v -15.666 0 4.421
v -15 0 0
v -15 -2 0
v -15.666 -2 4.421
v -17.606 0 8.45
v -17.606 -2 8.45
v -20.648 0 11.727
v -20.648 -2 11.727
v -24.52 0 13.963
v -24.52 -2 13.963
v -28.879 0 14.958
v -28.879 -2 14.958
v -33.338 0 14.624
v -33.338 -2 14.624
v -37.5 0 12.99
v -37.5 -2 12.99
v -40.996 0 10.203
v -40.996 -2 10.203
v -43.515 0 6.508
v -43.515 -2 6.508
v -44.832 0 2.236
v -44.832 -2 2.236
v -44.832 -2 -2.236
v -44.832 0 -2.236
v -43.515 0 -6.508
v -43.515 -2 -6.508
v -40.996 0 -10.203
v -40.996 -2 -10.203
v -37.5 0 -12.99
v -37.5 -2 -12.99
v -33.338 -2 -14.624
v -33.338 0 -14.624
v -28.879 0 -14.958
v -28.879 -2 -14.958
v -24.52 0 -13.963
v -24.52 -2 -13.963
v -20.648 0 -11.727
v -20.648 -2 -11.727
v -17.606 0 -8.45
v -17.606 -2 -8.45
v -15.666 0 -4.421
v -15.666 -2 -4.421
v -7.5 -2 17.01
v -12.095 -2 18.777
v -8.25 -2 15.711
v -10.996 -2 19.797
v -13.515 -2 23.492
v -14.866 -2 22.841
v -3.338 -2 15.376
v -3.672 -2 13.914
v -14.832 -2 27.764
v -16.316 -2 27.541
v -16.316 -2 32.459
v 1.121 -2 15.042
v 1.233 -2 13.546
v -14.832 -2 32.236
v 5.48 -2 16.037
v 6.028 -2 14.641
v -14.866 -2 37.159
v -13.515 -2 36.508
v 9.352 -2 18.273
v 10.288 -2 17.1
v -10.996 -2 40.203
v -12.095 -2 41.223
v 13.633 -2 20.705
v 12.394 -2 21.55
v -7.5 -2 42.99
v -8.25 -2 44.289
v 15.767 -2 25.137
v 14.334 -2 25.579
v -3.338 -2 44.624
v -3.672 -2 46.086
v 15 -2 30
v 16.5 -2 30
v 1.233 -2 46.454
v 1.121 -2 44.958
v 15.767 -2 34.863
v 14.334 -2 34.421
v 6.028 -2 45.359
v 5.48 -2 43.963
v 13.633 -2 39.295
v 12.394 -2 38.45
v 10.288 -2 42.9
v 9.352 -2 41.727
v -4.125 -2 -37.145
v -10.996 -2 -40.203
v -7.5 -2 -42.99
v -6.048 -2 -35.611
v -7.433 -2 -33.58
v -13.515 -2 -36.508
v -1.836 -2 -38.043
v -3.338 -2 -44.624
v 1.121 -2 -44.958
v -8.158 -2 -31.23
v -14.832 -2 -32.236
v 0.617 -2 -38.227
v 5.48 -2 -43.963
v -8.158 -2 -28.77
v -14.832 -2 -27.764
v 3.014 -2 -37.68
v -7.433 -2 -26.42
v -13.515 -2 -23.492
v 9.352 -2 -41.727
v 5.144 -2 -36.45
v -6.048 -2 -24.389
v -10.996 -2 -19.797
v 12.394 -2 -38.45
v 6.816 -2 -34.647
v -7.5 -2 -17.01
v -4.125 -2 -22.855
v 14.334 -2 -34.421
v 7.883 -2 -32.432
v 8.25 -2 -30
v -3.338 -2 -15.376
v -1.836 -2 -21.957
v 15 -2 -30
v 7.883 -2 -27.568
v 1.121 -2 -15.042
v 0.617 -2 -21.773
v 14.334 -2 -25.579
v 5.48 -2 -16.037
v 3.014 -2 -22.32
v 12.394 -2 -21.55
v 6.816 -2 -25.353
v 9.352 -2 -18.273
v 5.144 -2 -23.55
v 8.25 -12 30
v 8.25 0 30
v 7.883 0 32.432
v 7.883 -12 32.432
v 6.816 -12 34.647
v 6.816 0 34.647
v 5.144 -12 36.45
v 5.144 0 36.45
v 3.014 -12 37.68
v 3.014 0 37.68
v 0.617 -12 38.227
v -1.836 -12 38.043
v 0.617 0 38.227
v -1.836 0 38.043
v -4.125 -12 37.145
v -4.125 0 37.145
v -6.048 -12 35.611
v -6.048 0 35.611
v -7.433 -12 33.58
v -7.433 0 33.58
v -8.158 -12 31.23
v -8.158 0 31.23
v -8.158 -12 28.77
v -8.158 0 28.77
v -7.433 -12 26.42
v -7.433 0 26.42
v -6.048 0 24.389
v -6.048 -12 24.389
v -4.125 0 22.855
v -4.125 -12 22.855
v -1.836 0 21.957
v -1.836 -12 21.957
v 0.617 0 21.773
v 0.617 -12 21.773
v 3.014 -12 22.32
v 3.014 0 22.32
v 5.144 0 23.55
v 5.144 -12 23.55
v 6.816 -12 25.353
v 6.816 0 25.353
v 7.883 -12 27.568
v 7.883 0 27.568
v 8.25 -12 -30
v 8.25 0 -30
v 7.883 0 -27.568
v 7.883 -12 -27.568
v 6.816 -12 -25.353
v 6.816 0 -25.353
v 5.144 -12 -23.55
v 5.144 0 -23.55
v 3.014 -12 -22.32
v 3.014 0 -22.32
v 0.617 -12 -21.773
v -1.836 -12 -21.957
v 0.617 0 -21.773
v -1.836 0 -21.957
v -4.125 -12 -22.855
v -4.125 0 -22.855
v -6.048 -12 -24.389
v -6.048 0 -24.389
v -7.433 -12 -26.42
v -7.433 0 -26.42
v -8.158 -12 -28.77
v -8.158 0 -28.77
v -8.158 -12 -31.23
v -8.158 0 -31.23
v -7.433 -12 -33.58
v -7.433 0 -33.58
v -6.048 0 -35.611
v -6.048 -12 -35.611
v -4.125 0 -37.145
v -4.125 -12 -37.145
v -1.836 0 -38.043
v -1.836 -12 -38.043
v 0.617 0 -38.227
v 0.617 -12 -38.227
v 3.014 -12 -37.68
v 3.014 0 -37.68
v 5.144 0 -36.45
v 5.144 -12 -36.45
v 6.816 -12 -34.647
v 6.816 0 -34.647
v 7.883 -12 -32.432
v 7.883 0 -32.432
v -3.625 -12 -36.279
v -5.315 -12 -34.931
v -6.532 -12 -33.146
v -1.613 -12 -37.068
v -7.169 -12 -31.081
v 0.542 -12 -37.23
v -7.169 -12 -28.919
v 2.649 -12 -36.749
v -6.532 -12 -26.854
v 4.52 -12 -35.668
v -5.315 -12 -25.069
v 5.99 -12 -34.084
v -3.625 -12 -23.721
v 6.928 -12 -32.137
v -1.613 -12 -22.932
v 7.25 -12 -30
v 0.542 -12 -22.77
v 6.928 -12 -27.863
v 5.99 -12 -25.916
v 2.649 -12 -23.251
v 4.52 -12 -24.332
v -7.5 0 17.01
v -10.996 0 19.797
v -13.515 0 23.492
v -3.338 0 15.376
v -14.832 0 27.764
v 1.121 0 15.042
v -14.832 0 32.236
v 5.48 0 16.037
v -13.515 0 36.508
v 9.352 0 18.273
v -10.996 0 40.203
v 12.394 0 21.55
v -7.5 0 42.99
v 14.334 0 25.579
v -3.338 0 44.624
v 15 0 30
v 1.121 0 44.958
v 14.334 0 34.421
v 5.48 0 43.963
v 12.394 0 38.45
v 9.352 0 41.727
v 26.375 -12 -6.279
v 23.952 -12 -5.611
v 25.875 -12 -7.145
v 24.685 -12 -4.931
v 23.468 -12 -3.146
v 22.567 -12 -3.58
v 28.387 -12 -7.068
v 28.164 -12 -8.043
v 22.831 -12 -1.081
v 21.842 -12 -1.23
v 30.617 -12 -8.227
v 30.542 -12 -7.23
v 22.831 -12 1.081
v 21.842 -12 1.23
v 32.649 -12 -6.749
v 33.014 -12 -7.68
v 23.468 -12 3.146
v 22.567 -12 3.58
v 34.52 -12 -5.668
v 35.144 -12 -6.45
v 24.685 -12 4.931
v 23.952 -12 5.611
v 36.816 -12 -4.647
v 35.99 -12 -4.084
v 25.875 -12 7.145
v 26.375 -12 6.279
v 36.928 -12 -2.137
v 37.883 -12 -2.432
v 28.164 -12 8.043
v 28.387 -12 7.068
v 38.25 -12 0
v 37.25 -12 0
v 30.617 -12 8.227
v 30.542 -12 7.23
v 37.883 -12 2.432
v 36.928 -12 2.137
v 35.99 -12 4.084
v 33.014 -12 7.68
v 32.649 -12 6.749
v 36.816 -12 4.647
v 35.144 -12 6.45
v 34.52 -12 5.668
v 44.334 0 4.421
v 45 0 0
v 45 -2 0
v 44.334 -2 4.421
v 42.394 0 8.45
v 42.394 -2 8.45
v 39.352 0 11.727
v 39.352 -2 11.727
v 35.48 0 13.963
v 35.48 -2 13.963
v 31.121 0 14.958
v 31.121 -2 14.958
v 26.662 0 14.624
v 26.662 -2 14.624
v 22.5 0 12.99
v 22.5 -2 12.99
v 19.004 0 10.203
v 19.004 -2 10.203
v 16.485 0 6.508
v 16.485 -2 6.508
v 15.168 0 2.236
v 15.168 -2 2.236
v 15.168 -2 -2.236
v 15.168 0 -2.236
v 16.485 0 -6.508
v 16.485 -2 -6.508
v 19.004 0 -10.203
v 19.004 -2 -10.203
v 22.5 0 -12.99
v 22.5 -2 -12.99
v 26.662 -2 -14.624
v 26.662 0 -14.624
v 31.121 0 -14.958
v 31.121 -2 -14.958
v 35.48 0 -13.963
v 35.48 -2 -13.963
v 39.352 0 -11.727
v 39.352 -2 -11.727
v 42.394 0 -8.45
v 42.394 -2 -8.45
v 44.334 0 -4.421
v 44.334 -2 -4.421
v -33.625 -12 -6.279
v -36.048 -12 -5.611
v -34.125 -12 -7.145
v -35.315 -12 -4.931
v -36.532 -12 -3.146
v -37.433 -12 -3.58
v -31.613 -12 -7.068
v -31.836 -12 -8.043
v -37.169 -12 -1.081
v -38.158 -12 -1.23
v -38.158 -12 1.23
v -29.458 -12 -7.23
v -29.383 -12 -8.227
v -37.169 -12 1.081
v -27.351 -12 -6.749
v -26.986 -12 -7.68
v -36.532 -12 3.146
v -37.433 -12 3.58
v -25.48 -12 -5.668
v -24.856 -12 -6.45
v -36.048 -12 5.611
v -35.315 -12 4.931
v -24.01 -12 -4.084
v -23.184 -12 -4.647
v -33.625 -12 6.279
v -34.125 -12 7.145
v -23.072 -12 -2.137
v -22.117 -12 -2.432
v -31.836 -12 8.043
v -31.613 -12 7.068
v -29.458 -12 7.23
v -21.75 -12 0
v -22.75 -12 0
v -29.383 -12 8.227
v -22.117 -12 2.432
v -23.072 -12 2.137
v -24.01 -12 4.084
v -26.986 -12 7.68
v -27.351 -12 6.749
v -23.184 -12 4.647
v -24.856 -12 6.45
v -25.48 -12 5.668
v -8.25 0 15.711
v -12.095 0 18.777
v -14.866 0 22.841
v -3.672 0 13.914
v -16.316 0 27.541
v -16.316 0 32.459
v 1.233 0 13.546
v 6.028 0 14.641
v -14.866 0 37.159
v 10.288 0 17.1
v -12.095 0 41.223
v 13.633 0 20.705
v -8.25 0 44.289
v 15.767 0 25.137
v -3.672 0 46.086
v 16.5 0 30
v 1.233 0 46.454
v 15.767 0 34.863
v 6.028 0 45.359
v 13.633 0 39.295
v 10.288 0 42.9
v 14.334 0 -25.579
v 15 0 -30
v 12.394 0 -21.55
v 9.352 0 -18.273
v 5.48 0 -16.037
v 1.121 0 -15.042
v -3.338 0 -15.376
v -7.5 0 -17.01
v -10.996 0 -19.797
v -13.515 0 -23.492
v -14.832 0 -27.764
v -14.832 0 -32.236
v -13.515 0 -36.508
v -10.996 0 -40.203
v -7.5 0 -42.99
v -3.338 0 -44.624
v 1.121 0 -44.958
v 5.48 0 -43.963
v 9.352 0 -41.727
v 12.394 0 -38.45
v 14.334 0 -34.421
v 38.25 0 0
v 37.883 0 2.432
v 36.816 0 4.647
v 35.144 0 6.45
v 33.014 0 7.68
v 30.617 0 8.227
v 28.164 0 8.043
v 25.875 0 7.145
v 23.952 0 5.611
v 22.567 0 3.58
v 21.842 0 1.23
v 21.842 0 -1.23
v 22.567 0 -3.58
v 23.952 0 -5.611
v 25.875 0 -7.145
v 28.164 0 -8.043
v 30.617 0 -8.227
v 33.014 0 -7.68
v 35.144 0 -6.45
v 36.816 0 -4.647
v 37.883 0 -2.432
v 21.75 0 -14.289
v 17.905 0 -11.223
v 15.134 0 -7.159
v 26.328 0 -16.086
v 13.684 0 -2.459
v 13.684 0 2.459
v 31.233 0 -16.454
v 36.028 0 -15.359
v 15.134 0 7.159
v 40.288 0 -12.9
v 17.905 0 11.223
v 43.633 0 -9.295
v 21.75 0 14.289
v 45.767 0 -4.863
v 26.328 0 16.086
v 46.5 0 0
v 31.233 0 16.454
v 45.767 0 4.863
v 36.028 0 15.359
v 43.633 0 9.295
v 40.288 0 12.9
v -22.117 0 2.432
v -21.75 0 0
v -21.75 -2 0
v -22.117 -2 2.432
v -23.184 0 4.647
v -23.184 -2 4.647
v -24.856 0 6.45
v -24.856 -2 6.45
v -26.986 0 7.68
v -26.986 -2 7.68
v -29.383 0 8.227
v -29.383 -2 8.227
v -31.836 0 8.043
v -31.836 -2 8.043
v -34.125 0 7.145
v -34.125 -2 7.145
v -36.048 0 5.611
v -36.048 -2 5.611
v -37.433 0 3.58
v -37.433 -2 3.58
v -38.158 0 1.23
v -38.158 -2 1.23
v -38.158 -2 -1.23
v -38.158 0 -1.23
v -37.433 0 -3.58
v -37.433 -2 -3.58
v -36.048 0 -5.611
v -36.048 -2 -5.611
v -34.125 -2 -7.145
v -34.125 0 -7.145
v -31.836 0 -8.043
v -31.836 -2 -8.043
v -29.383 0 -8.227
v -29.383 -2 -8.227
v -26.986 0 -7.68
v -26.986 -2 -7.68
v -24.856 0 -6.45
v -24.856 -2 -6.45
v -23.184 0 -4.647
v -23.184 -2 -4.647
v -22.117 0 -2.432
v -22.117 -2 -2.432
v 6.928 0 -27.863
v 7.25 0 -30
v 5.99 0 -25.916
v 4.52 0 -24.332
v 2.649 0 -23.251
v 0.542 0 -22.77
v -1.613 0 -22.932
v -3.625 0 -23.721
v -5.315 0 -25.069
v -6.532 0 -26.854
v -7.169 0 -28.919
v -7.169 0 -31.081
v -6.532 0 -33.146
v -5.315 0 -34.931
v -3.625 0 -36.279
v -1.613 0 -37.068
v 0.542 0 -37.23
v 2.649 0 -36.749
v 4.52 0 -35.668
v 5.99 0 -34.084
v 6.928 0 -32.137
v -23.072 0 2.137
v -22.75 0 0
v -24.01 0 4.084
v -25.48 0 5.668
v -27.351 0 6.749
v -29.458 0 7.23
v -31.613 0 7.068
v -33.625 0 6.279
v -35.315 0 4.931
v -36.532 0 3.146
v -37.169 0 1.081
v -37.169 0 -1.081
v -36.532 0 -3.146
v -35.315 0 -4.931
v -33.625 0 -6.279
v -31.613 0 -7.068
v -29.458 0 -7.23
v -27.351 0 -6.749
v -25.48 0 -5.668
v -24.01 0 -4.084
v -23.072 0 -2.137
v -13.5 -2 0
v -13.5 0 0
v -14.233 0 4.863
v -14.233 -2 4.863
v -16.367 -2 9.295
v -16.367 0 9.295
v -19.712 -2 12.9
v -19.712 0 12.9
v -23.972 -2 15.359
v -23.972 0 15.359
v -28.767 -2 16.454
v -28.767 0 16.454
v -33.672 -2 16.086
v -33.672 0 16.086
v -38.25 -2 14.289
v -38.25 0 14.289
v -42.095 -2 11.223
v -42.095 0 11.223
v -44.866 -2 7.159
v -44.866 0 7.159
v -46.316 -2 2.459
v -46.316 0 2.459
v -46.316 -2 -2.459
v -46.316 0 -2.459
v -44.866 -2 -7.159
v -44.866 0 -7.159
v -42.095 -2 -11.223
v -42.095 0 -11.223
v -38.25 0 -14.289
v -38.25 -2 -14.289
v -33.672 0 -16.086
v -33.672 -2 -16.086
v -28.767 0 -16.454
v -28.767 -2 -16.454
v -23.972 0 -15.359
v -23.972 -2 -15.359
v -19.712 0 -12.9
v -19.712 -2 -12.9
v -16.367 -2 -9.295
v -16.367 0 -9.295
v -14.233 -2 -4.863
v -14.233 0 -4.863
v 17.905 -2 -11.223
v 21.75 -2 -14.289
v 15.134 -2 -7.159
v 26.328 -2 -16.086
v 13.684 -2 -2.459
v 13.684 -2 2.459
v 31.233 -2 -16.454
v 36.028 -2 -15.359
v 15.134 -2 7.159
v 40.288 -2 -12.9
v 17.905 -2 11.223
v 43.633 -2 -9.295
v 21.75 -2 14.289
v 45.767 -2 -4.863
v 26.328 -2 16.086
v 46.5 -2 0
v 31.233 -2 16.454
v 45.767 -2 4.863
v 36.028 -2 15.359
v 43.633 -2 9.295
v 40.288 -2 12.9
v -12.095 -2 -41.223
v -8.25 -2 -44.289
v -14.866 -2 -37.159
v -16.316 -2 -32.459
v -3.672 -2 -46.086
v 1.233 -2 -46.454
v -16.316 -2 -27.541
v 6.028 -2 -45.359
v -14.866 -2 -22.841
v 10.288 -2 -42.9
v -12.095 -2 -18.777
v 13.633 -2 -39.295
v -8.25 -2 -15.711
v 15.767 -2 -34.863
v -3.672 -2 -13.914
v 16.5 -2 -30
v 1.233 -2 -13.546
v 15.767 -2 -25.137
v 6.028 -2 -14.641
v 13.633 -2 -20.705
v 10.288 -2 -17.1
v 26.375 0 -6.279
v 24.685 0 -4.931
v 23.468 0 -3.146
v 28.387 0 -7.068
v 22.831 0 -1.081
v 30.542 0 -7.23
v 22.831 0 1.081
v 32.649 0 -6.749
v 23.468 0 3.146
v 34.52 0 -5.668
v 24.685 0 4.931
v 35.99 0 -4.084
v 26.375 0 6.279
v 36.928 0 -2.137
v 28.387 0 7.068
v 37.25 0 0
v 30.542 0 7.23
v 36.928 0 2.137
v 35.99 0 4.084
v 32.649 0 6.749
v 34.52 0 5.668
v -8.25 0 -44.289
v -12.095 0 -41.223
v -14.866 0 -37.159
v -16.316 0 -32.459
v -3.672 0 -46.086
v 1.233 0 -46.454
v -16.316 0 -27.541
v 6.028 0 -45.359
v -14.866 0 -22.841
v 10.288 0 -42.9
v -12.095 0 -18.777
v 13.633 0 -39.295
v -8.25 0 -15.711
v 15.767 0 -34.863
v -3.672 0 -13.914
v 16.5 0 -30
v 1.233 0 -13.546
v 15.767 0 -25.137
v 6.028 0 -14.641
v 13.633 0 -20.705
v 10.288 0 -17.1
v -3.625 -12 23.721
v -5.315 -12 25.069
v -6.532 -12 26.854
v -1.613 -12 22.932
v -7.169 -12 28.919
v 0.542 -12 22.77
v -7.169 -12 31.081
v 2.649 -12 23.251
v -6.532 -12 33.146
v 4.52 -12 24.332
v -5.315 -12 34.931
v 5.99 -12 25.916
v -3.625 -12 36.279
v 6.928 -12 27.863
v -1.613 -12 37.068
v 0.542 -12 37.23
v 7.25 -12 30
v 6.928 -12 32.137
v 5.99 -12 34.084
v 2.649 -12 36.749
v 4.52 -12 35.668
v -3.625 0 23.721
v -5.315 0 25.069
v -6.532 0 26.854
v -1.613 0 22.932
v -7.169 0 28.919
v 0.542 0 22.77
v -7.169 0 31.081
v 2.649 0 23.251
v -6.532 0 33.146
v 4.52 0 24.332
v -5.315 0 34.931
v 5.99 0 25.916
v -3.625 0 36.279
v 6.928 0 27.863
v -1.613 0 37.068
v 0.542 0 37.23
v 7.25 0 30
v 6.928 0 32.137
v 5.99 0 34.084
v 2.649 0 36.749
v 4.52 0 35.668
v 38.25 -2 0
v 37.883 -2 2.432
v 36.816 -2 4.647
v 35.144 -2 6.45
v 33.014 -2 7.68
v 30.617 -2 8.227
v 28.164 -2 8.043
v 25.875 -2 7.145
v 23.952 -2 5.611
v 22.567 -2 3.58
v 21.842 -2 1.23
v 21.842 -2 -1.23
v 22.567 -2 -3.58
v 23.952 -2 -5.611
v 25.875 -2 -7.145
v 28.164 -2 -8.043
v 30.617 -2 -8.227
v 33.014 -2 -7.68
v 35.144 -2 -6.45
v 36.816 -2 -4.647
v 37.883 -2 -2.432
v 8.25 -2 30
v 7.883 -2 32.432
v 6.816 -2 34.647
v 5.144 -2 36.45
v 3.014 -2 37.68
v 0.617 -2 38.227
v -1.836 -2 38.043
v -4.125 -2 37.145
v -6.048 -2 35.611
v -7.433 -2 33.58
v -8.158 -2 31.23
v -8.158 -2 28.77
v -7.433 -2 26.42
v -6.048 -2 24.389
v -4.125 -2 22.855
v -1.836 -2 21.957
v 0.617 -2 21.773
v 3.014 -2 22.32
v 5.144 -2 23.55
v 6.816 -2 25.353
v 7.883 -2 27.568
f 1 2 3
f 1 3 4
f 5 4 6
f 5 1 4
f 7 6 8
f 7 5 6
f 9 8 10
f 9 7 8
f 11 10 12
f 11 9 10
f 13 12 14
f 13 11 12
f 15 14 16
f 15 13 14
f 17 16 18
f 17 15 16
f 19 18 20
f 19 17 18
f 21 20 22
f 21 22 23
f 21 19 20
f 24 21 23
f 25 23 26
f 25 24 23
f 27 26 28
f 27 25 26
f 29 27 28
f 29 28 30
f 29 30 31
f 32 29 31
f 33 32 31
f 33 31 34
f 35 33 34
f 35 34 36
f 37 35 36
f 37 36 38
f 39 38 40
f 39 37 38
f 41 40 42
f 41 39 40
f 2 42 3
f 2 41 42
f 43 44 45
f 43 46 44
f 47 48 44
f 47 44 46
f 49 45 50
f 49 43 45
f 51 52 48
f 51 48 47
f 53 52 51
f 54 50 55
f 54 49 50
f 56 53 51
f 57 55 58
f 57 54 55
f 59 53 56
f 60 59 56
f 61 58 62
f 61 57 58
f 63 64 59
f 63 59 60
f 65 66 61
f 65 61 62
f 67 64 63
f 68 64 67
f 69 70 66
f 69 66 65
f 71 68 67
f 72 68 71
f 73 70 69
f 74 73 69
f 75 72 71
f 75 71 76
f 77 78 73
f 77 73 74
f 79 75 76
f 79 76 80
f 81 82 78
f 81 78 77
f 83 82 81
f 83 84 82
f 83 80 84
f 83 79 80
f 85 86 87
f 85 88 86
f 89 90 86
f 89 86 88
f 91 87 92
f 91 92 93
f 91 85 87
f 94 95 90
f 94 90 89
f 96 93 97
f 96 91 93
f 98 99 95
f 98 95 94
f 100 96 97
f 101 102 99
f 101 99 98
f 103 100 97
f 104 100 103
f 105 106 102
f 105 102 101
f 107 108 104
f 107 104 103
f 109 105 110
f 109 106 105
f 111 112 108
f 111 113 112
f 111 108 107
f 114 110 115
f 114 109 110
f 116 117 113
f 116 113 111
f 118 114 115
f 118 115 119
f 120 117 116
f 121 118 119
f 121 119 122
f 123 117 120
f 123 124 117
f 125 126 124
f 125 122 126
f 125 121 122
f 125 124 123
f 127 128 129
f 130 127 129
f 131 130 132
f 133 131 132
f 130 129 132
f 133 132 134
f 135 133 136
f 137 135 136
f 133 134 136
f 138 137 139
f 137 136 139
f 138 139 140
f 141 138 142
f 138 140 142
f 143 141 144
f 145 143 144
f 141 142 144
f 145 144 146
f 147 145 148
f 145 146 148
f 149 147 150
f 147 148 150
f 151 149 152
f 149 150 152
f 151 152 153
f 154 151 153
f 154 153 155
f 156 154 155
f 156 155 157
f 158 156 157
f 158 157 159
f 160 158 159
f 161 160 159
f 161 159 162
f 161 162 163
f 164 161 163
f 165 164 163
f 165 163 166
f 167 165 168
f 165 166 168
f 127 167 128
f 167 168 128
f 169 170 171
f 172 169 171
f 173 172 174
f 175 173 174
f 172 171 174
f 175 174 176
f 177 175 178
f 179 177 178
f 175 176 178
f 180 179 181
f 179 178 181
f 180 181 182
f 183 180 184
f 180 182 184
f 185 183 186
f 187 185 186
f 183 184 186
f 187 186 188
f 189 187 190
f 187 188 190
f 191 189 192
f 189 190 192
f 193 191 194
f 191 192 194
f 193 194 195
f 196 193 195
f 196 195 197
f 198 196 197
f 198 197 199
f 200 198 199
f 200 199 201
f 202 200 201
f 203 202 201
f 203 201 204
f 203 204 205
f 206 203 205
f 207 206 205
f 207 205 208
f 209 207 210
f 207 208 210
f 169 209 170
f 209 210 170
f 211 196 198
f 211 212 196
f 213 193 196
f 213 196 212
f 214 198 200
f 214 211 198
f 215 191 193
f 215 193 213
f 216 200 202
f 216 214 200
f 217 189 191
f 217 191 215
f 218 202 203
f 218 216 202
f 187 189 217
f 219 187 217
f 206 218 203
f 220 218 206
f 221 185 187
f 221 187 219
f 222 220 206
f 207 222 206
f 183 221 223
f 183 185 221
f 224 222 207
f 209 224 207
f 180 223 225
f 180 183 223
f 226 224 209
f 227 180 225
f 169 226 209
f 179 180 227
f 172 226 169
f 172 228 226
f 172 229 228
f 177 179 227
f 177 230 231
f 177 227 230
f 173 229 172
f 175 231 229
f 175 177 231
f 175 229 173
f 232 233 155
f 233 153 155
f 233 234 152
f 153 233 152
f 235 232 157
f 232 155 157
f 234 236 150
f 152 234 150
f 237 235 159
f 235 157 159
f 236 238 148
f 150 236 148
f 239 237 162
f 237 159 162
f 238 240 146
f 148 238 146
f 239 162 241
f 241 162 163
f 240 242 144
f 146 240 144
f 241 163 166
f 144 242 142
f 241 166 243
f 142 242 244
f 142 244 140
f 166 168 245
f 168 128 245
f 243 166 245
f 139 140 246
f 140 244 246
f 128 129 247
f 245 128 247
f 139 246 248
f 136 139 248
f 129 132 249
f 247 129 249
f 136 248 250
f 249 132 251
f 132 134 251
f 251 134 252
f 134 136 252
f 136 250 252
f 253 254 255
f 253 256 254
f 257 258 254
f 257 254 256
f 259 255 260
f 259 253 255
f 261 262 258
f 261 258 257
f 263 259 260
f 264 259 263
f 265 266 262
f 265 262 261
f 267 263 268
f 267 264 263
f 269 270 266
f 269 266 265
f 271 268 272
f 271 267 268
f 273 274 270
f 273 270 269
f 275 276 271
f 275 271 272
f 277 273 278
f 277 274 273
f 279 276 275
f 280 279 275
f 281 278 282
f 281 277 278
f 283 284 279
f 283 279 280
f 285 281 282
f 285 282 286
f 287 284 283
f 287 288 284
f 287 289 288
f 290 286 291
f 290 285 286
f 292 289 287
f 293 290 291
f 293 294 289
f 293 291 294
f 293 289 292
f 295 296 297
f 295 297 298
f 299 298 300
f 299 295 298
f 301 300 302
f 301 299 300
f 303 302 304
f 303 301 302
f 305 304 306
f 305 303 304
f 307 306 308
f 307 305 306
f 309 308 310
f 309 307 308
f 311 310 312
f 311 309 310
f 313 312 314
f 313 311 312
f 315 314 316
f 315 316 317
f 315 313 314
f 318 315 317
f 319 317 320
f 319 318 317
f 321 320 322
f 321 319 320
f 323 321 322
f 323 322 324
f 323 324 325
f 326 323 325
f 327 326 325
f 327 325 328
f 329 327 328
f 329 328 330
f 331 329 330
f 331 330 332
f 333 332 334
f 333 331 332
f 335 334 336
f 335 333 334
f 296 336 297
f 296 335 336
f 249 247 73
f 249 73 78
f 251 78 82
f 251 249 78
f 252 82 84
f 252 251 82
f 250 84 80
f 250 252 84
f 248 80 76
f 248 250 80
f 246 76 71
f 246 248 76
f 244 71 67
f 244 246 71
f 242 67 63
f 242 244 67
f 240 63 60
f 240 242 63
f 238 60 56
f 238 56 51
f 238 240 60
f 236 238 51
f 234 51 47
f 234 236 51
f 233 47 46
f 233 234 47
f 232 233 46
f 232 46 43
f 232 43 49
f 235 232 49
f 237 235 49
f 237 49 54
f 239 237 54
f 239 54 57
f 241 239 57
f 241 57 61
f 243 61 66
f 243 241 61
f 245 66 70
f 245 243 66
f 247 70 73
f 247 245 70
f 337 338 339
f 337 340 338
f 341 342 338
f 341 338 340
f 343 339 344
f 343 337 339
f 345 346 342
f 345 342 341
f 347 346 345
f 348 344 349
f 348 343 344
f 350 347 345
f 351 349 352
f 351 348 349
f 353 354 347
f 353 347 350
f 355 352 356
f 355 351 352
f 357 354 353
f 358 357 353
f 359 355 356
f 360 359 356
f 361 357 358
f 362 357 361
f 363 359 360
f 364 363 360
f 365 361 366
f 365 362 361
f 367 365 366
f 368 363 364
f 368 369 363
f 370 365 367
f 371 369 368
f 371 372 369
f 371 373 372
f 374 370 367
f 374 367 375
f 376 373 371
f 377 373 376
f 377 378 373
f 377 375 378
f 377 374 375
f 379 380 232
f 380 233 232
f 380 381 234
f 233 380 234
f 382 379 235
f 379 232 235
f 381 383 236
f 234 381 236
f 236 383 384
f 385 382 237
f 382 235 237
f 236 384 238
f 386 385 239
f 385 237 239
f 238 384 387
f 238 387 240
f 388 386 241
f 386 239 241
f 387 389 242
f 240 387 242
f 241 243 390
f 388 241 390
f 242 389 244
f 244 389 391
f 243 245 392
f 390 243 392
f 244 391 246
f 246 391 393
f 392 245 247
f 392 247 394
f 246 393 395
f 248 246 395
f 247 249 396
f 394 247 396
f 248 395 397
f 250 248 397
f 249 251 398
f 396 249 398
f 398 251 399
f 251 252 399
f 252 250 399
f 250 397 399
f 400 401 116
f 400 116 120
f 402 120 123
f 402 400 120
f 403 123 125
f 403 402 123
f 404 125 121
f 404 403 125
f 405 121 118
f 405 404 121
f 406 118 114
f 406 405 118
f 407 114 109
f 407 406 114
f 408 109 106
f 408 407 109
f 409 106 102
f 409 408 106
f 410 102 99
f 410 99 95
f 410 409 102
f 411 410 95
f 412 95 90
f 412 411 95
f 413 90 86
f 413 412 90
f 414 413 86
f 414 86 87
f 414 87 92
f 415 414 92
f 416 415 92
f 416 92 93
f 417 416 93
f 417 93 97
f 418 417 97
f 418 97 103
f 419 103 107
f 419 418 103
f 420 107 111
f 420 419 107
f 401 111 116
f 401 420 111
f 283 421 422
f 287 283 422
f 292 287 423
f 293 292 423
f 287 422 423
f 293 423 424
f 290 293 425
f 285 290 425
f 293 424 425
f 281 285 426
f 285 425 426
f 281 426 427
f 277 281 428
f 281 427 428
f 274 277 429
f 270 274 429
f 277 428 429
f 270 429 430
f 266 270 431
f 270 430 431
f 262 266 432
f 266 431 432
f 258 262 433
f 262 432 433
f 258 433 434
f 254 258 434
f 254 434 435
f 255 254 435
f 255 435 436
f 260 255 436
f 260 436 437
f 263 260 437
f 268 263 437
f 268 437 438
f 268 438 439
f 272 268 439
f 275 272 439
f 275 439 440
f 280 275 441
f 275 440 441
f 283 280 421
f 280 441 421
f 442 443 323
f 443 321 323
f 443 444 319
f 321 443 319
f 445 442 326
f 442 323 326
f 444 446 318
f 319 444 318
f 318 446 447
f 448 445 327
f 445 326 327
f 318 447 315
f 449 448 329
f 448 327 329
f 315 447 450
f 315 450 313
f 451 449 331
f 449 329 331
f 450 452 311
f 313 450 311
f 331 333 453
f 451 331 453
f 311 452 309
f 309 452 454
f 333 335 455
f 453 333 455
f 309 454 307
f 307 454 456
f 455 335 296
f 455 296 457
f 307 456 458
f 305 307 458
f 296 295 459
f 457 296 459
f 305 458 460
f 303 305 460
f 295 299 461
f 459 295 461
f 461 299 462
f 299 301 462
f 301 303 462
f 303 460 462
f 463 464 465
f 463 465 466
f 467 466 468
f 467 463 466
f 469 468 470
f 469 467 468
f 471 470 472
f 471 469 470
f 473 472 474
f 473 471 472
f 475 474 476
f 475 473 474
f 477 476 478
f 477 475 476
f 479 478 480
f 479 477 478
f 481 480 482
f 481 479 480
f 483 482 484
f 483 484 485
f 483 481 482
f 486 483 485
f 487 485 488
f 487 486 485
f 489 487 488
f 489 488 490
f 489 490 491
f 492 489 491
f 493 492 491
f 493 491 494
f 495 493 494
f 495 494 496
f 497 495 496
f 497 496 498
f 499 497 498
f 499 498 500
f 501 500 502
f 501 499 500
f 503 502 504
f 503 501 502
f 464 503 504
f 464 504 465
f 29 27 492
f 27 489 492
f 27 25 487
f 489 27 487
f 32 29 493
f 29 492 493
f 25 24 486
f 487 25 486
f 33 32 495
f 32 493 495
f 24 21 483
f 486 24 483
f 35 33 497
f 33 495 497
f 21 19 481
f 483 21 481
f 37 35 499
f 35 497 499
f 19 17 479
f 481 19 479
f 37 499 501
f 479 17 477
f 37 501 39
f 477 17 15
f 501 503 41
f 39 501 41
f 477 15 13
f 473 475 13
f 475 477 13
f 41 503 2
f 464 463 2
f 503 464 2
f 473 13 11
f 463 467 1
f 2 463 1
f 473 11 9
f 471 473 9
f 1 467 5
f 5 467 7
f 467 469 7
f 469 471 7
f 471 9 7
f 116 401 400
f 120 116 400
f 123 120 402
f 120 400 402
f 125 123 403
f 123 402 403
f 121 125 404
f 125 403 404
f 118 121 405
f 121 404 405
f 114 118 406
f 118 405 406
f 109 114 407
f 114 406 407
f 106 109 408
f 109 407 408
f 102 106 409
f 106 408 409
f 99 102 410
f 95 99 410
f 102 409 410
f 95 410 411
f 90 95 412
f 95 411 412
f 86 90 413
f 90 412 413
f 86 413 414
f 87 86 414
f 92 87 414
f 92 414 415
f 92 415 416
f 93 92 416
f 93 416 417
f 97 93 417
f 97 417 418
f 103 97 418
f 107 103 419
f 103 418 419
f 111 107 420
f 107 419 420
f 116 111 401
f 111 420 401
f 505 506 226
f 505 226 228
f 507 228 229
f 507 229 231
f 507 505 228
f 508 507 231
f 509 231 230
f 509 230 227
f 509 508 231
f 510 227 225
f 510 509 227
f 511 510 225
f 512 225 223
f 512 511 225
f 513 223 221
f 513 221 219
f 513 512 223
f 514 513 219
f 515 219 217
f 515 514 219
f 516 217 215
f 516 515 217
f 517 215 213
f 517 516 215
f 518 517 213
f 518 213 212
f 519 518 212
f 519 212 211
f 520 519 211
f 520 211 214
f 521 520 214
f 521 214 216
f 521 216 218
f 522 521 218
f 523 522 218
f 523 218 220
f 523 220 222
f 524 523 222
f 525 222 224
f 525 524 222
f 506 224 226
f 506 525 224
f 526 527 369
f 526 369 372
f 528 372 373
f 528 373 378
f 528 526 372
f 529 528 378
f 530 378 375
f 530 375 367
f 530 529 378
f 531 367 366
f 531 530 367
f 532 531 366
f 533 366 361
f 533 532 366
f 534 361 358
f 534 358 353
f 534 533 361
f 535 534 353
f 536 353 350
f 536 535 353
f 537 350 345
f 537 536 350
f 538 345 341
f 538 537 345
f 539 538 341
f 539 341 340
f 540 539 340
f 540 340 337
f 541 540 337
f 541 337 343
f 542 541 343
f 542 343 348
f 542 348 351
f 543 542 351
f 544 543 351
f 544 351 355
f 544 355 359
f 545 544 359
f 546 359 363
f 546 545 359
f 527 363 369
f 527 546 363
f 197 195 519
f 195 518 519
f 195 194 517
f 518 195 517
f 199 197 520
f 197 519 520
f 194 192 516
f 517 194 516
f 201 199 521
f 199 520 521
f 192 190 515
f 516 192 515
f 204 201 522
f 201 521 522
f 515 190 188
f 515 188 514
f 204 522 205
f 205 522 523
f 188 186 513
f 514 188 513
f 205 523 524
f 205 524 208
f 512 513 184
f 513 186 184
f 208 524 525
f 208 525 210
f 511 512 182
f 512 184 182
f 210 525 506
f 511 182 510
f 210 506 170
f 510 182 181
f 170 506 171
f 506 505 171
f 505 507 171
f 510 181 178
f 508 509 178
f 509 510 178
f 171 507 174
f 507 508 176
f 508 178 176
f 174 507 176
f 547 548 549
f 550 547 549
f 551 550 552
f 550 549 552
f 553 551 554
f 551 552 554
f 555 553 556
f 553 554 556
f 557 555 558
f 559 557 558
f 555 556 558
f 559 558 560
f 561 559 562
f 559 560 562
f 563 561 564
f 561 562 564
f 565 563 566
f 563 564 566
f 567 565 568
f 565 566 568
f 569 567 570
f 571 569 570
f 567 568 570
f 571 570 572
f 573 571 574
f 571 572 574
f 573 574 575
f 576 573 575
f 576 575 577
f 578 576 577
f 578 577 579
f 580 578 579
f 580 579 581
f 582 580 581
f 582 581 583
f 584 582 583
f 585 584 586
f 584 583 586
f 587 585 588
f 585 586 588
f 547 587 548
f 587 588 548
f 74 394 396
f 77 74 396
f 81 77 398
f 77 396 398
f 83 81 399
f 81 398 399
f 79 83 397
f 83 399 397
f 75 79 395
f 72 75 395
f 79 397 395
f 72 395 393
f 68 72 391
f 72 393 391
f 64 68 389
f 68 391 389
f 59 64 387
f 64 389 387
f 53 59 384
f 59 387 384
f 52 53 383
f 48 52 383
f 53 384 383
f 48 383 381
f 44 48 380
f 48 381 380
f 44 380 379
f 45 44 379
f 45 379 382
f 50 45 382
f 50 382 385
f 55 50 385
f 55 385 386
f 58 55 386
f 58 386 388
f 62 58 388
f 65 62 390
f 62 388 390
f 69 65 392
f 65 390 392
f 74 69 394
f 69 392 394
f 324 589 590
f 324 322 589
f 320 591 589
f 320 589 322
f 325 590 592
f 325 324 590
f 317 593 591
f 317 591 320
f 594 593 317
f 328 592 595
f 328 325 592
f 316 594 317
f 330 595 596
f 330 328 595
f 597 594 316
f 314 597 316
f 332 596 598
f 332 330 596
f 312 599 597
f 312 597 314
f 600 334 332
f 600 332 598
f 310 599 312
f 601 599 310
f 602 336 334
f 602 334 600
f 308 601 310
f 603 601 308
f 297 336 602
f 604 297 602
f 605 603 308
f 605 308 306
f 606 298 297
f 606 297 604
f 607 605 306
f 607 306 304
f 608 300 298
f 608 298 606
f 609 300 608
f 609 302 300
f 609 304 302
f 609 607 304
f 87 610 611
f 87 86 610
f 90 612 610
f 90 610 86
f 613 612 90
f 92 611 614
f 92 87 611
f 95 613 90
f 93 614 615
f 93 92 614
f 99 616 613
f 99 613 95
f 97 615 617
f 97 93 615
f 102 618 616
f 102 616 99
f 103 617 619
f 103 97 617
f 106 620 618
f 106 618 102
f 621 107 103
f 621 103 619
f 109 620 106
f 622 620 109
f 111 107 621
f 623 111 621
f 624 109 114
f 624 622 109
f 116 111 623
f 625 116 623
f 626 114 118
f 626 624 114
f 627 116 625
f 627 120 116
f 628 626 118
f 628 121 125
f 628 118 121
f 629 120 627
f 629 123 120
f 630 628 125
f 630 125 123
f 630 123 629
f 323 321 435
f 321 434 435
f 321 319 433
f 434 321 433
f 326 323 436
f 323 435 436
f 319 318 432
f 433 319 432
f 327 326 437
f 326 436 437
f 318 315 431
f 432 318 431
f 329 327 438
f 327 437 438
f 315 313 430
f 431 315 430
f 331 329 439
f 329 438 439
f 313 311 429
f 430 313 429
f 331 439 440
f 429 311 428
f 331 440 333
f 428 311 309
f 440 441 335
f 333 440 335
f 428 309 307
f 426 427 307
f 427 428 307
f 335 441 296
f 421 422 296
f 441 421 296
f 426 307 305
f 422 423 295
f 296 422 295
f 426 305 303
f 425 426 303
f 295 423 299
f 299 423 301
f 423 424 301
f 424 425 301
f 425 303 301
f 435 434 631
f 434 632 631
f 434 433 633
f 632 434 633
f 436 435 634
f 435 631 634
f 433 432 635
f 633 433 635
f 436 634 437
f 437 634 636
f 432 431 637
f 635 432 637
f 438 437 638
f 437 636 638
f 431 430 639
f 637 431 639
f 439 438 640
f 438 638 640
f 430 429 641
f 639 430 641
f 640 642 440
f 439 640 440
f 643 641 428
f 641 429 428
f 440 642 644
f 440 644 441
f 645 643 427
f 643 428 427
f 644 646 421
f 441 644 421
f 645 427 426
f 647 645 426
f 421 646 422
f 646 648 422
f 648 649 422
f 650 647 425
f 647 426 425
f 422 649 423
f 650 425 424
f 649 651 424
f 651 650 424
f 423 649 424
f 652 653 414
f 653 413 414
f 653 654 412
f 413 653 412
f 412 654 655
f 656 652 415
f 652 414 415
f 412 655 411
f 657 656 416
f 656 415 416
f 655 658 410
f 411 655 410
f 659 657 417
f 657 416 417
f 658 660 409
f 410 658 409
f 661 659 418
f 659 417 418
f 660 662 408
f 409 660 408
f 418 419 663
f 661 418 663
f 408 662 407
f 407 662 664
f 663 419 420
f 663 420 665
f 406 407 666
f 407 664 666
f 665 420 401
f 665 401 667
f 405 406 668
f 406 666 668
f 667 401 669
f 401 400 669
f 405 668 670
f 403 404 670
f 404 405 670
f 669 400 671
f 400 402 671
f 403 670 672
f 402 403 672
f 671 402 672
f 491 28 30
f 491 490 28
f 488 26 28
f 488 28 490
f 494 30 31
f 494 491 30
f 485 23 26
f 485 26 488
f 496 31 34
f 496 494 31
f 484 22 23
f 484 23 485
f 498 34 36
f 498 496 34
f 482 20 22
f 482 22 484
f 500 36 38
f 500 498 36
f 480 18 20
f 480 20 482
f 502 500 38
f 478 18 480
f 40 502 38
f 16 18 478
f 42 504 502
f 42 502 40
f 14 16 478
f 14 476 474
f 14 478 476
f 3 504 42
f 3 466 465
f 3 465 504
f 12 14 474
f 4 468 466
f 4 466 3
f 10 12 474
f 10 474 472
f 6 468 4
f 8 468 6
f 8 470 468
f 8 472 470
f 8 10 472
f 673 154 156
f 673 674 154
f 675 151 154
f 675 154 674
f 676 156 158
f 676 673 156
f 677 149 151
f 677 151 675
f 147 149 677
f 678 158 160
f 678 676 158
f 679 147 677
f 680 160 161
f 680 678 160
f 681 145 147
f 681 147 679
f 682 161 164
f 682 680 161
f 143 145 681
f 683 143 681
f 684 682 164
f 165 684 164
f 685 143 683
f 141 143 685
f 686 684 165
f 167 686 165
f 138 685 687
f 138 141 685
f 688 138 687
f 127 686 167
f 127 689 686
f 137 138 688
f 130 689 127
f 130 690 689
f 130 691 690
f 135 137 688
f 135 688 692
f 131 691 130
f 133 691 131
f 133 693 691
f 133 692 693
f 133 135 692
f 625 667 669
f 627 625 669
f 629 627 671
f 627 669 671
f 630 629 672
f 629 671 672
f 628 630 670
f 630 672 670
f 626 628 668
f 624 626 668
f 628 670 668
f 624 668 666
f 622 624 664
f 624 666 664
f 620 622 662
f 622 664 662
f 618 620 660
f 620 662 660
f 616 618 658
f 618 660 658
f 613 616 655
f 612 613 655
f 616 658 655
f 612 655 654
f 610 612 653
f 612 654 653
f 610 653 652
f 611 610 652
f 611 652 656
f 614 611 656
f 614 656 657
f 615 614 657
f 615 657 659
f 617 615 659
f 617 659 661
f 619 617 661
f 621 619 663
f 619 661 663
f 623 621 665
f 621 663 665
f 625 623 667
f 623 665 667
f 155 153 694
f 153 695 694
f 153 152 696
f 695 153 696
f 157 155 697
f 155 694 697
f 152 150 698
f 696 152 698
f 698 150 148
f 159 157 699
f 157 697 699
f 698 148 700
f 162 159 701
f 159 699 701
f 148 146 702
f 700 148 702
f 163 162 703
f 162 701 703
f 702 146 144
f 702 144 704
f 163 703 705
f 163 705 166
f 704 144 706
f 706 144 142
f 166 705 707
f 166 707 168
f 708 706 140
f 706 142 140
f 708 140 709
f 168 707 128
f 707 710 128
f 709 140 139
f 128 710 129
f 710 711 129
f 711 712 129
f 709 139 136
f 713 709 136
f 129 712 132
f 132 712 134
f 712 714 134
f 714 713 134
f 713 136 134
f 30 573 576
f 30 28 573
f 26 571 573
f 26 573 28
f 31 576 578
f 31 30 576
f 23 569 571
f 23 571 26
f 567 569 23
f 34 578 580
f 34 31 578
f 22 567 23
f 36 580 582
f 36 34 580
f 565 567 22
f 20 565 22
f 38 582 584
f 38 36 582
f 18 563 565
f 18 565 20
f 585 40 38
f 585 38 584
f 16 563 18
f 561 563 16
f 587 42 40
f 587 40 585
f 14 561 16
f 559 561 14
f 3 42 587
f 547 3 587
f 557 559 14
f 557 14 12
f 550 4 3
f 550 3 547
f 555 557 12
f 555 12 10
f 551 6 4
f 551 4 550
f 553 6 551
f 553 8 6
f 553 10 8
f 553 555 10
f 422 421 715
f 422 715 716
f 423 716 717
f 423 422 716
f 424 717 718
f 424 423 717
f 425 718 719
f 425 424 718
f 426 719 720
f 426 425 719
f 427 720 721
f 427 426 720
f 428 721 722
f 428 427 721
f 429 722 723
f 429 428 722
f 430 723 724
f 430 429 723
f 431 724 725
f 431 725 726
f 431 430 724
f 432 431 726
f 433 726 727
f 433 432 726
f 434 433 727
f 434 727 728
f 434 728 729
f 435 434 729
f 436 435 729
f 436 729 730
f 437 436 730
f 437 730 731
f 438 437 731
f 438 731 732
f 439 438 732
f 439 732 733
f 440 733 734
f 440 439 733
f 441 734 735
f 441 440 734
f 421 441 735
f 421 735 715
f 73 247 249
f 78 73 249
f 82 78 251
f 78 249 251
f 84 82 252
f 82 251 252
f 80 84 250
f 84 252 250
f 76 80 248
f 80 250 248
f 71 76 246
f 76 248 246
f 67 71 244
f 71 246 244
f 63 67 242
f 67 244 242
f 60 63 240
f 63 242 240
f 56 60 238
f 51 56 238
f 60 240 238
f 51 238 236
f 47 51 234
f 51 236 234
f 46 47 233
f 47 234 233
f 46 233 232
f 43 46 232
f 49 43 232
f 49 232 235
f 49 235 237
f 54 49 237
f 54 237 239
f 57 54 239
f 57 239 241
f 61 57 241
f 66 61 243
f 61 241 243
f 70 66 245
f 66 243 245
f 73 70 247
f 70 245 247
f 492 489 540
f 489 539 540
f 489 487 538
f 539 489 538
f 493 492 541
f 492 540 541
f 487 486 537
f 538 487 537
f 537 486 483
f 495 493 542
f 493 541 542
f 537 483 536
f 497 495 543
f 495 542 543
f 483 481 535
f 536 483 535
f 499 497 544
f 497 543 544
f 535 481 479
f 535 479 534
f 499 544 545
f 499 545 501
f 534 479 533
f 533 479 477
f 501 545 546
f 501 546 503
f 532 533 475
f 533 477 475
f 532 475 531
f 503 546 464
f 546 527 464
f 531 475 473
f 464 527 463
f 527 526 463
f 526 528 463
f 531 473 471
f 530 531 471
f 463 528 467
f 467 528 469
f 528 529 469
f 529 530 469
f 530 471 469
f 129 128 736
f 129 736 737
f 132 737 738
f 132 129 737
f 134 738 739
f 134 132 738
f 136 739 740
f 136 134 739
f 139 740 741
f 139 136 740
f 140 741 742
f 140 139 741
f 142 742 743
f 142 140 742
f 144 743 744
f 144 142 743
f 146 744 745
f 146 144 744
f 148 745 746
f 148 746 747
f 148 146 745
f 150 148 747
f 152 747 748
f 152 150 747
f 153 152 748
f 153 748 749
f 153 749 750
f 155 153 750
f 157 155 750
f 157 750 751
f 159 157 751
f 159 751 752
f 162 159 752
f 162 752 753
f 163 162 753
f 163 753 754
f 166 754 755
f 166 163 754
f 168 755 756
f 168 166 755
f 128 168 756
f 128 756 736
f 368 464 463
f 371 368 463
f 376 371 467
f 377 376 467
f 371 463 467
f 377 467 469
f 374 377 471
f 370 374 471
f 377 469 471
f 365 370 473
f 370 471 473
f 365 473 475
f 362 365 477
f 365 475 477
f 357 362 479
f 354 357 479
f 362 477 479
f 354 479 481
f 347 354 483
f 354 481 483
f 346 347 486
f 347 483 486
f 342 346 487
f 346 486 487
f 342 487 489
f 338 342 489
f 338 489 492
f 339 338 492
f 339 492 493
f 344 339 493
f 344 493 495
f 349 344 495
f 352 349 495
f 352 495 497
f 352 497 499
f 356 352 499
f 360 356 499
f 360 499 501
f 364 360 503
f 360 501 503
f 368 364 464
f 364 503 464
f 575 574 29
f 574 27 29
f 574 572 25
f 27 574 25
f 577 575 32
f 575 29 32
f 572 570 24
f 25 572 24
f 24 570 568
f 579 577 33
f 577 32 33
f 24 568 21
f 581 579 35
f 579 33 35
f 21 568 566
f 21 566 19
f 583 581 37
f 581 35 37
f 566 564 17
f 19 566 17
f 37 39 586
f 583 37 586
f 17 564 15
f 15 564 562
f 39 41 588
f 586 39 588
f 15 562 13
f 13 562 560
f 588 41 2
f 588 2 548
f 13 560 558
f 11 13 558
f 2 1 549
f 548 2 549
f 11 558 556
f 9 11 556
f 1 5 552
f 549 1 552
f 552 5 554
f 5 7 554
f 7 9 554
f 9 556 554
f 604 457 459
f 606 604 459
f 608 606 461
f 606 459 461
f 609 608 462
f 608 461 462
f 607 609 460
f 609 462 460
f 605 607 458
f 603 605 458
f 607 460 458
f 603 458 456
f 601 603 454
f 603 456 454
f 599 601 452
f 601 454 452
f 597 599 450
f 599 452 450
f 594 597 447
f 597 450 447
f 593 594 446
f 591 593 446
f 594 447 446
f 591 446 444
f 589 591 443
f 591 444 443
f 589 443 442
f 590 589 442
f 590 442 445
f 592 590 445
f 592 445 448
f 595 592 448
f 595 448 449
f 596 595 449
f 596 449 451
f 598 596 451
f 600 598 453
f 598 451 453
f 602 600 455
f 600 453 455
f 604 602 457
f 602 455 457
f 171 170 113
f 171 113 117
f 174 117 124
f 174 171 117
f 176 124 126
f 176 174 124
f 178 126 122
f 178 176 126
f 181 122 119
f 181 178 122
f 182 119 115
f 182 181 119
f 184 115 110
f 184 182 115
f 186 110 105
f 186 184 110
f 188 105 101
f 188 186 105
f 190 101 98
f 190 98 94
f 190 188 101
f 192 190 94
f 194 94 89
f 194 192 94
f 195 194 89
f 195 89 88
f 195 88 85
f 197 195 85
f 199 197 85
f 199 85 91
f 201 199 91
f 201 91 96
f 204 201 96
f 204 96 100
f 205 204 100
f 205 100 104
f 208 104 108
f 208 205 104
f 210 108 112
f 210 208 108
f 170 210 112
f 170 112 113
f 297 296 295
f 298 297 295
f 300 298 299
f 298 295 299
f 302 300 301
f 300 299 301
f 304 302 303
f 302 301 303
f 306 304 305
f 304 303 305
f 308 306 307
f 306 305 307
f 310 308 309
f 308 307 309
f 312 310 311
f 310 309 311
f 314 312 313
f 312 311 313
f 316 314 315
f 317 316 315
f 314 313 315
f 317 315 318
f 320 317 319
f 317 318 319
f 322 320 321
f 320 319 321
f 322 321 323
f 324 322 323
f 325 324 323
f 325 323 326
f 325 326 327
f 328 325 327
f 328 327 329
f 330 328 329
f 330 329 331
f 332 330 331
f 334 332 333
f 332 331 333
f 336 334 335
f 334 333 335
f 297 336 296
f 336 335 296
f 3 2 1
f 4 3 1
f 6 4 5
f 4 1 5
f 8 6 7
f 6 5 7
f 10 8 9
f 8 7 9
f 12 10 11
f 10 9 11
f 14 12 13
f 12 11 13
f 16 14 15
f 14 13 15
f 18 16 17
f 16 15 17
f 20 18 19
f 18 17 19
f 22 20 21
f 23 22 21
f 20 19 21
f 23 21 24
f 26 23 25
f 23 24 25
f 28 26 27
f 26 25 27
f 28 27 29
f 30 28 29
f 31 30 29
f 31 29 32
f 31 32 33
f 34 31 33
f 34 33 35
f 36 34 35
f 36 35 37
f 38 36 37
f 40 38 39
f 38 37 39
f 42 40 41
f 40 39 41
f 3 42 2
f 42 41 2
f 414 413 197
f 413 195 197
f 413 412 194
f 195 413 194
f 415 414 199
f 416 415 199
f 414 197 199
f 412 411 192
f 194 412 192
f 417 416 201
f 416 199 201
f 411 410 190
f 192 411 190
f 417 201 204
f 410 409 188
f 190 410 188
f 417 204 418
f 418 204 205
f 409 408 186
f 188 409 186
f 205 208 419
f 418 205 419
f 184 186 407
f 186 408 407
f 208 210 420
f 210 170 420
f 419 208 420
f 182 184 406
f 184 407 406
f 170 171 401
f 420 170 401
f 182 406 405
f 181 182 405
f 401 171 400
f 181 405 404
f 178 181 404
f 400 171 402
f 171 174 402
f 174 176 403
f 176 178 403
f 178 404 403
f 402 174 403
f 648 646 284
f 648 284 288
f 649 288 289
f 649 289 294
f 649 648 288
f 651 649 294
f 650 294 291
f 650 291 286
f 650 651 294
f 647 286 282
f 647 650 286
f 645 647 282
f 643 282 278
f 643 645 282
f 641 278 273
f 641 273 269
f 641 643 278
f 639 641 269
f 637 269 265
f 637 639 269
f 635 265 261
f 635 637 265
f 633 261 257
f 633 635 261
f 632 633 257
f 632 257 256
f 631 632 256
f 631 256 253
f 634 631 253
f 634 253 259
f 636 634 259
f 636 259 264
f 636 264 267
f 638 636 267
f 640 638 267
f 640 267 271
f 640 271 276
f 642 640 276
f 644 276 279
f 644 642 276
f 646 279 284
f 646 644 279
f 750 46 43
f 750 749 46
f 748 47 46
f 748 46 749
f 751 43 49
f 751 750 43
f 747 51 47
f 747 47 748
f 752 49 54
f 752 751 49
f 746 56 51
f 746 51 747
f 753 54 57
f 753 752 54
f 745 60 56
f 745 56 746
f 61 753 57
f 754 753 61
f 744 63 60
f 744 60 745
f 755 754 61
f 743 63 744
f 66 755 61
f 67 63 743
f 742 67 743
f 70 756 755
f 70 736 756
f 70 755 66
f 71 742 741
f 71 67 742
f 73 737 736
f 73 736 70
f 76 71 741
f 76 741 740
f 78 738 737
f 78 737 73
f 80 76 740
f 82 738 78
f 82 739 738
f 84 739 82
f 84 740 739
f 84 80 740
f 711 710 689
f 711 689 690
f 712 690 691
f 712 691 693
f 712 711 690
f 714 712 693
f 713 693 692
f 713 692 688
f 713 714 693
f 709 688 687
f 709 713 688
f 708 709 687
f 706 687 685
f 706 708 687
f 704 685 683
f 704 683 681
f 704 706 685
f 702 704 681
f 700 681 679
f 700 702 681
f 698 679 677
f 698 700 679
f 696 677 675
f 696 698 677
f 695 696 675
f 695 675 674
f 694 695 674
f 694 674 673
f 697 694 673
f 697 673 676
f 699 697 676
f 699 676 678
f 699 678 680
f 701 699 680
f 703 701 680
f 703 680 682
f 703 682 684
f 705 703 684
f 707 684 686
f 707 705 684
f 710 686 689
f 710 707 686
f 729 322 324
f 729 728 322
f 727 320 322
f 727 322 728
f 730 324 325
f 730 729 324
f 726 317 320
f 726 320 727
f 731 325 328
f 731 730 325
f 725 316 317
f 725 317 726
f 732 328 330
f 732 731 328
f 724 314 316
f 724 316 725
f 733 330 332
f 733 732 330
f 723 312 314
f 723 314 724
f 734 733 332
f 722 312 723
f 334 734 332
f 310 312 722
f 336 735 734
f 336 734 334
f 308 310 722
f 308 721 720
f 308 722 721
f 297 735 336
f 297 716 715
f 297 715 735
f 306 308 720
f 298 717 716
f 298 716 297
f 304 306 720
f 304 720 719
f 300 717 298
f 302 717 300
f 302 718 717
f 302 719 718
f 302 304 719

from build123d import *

# Parameters (mm, degrees)
F0_R     = 8.25
F0_R_2   = 7.25
F1_DEPTH = 12
F0_R_3   = 15
F2_DEPTH = 2
F0_R_4   = 16.5
F3_DEPTH = 2


with BuildPart() as f1:
    # F0 (on Front) → F1 (new body)
    with BuildSketch(Plane.XZ):
        with Locations((-30, 0)):
            Circle(F0_R)
        with Locations((-30, 0)):
            Circle(F0_R_2, mode=Mode.SUBTRACT)
        with Locations((0, -30)):
            Circle(F0_R)
        with Locations((0, -30)):
            Circle(F0_R_2, mode=Mode.SUBTRACT)
        with Locations((30, 0)):
            Circle(F0_R)
        with Locations((30, 0)):
            Circle(F0_R_2, mode=Mode.SUBTRACT)
        with Locations((0, 30)):
            Circle(F0_R)
        with Locations((0, 30)):
            Circle(F0_R_2, mode=Mode.SUBTRACT)
    extrude(amount=F1_DEPTH)


with BuildPart() as f2:
    # F0 (on Front) → F2 (new body)
    with BuildSketch(Plane.XZ):
        with Locations((-30, 0)):
            Circle(F0_R_3)
        with Locations((-30, 0)):
            Circle(F0_R, mode=Mode.SUBTRACT)
        with Locations((0, -30)):
            Circle(F0_R_3)
        with Locations((0, -30)):
            Circle(F0_R, mode=Mode.SUBTRACT)
        with Locations((30, 0)):
            Circle(F0_R_3)
        with Locations((30, 0)):
            Circle(F0_R, mode=Mode.SUBTRACT)
        with Locations((0, 30)):
            Circle(F0_R_3)
        with Locations((0, 30)):
            Circle(F0_R, mode=Mode.SUBTRACT)
    extrude(amount=F2_DEPTH)


with BuildPart() as f3:
    # F0 (on Front) → F3 (new body)
    with BuildSketch(Plane.XZ):
        with Locations((30, 0)):
            Circle(F0_R_4)
        with Locations((30, 0)):
            Circle(F0_R_3, mode=Mode.SUBTRACT)
        with Locations((0, -30)):
            Circle(F0_R_4)
        with Locations((0, -30)):
            Circle(F0_R_3, mode=Mode.SUBTRACT)
        with Locations((-30, 0)):
            Circle(F0_R_4)
        with Locations((-30, 0)):
            Circle(F0_R_3, mode=Mode.SUBTRACT)
        with Locations((0, 30)):
            Circle(F0_R_4)
        with Locations((0, 30)):
            Circle(F0_R_3, mode=Mode.SUBTRACT)
    extrude(amount=F3_DEPTH)


solid = Compound([f1.part, f2.part, f3.part])
